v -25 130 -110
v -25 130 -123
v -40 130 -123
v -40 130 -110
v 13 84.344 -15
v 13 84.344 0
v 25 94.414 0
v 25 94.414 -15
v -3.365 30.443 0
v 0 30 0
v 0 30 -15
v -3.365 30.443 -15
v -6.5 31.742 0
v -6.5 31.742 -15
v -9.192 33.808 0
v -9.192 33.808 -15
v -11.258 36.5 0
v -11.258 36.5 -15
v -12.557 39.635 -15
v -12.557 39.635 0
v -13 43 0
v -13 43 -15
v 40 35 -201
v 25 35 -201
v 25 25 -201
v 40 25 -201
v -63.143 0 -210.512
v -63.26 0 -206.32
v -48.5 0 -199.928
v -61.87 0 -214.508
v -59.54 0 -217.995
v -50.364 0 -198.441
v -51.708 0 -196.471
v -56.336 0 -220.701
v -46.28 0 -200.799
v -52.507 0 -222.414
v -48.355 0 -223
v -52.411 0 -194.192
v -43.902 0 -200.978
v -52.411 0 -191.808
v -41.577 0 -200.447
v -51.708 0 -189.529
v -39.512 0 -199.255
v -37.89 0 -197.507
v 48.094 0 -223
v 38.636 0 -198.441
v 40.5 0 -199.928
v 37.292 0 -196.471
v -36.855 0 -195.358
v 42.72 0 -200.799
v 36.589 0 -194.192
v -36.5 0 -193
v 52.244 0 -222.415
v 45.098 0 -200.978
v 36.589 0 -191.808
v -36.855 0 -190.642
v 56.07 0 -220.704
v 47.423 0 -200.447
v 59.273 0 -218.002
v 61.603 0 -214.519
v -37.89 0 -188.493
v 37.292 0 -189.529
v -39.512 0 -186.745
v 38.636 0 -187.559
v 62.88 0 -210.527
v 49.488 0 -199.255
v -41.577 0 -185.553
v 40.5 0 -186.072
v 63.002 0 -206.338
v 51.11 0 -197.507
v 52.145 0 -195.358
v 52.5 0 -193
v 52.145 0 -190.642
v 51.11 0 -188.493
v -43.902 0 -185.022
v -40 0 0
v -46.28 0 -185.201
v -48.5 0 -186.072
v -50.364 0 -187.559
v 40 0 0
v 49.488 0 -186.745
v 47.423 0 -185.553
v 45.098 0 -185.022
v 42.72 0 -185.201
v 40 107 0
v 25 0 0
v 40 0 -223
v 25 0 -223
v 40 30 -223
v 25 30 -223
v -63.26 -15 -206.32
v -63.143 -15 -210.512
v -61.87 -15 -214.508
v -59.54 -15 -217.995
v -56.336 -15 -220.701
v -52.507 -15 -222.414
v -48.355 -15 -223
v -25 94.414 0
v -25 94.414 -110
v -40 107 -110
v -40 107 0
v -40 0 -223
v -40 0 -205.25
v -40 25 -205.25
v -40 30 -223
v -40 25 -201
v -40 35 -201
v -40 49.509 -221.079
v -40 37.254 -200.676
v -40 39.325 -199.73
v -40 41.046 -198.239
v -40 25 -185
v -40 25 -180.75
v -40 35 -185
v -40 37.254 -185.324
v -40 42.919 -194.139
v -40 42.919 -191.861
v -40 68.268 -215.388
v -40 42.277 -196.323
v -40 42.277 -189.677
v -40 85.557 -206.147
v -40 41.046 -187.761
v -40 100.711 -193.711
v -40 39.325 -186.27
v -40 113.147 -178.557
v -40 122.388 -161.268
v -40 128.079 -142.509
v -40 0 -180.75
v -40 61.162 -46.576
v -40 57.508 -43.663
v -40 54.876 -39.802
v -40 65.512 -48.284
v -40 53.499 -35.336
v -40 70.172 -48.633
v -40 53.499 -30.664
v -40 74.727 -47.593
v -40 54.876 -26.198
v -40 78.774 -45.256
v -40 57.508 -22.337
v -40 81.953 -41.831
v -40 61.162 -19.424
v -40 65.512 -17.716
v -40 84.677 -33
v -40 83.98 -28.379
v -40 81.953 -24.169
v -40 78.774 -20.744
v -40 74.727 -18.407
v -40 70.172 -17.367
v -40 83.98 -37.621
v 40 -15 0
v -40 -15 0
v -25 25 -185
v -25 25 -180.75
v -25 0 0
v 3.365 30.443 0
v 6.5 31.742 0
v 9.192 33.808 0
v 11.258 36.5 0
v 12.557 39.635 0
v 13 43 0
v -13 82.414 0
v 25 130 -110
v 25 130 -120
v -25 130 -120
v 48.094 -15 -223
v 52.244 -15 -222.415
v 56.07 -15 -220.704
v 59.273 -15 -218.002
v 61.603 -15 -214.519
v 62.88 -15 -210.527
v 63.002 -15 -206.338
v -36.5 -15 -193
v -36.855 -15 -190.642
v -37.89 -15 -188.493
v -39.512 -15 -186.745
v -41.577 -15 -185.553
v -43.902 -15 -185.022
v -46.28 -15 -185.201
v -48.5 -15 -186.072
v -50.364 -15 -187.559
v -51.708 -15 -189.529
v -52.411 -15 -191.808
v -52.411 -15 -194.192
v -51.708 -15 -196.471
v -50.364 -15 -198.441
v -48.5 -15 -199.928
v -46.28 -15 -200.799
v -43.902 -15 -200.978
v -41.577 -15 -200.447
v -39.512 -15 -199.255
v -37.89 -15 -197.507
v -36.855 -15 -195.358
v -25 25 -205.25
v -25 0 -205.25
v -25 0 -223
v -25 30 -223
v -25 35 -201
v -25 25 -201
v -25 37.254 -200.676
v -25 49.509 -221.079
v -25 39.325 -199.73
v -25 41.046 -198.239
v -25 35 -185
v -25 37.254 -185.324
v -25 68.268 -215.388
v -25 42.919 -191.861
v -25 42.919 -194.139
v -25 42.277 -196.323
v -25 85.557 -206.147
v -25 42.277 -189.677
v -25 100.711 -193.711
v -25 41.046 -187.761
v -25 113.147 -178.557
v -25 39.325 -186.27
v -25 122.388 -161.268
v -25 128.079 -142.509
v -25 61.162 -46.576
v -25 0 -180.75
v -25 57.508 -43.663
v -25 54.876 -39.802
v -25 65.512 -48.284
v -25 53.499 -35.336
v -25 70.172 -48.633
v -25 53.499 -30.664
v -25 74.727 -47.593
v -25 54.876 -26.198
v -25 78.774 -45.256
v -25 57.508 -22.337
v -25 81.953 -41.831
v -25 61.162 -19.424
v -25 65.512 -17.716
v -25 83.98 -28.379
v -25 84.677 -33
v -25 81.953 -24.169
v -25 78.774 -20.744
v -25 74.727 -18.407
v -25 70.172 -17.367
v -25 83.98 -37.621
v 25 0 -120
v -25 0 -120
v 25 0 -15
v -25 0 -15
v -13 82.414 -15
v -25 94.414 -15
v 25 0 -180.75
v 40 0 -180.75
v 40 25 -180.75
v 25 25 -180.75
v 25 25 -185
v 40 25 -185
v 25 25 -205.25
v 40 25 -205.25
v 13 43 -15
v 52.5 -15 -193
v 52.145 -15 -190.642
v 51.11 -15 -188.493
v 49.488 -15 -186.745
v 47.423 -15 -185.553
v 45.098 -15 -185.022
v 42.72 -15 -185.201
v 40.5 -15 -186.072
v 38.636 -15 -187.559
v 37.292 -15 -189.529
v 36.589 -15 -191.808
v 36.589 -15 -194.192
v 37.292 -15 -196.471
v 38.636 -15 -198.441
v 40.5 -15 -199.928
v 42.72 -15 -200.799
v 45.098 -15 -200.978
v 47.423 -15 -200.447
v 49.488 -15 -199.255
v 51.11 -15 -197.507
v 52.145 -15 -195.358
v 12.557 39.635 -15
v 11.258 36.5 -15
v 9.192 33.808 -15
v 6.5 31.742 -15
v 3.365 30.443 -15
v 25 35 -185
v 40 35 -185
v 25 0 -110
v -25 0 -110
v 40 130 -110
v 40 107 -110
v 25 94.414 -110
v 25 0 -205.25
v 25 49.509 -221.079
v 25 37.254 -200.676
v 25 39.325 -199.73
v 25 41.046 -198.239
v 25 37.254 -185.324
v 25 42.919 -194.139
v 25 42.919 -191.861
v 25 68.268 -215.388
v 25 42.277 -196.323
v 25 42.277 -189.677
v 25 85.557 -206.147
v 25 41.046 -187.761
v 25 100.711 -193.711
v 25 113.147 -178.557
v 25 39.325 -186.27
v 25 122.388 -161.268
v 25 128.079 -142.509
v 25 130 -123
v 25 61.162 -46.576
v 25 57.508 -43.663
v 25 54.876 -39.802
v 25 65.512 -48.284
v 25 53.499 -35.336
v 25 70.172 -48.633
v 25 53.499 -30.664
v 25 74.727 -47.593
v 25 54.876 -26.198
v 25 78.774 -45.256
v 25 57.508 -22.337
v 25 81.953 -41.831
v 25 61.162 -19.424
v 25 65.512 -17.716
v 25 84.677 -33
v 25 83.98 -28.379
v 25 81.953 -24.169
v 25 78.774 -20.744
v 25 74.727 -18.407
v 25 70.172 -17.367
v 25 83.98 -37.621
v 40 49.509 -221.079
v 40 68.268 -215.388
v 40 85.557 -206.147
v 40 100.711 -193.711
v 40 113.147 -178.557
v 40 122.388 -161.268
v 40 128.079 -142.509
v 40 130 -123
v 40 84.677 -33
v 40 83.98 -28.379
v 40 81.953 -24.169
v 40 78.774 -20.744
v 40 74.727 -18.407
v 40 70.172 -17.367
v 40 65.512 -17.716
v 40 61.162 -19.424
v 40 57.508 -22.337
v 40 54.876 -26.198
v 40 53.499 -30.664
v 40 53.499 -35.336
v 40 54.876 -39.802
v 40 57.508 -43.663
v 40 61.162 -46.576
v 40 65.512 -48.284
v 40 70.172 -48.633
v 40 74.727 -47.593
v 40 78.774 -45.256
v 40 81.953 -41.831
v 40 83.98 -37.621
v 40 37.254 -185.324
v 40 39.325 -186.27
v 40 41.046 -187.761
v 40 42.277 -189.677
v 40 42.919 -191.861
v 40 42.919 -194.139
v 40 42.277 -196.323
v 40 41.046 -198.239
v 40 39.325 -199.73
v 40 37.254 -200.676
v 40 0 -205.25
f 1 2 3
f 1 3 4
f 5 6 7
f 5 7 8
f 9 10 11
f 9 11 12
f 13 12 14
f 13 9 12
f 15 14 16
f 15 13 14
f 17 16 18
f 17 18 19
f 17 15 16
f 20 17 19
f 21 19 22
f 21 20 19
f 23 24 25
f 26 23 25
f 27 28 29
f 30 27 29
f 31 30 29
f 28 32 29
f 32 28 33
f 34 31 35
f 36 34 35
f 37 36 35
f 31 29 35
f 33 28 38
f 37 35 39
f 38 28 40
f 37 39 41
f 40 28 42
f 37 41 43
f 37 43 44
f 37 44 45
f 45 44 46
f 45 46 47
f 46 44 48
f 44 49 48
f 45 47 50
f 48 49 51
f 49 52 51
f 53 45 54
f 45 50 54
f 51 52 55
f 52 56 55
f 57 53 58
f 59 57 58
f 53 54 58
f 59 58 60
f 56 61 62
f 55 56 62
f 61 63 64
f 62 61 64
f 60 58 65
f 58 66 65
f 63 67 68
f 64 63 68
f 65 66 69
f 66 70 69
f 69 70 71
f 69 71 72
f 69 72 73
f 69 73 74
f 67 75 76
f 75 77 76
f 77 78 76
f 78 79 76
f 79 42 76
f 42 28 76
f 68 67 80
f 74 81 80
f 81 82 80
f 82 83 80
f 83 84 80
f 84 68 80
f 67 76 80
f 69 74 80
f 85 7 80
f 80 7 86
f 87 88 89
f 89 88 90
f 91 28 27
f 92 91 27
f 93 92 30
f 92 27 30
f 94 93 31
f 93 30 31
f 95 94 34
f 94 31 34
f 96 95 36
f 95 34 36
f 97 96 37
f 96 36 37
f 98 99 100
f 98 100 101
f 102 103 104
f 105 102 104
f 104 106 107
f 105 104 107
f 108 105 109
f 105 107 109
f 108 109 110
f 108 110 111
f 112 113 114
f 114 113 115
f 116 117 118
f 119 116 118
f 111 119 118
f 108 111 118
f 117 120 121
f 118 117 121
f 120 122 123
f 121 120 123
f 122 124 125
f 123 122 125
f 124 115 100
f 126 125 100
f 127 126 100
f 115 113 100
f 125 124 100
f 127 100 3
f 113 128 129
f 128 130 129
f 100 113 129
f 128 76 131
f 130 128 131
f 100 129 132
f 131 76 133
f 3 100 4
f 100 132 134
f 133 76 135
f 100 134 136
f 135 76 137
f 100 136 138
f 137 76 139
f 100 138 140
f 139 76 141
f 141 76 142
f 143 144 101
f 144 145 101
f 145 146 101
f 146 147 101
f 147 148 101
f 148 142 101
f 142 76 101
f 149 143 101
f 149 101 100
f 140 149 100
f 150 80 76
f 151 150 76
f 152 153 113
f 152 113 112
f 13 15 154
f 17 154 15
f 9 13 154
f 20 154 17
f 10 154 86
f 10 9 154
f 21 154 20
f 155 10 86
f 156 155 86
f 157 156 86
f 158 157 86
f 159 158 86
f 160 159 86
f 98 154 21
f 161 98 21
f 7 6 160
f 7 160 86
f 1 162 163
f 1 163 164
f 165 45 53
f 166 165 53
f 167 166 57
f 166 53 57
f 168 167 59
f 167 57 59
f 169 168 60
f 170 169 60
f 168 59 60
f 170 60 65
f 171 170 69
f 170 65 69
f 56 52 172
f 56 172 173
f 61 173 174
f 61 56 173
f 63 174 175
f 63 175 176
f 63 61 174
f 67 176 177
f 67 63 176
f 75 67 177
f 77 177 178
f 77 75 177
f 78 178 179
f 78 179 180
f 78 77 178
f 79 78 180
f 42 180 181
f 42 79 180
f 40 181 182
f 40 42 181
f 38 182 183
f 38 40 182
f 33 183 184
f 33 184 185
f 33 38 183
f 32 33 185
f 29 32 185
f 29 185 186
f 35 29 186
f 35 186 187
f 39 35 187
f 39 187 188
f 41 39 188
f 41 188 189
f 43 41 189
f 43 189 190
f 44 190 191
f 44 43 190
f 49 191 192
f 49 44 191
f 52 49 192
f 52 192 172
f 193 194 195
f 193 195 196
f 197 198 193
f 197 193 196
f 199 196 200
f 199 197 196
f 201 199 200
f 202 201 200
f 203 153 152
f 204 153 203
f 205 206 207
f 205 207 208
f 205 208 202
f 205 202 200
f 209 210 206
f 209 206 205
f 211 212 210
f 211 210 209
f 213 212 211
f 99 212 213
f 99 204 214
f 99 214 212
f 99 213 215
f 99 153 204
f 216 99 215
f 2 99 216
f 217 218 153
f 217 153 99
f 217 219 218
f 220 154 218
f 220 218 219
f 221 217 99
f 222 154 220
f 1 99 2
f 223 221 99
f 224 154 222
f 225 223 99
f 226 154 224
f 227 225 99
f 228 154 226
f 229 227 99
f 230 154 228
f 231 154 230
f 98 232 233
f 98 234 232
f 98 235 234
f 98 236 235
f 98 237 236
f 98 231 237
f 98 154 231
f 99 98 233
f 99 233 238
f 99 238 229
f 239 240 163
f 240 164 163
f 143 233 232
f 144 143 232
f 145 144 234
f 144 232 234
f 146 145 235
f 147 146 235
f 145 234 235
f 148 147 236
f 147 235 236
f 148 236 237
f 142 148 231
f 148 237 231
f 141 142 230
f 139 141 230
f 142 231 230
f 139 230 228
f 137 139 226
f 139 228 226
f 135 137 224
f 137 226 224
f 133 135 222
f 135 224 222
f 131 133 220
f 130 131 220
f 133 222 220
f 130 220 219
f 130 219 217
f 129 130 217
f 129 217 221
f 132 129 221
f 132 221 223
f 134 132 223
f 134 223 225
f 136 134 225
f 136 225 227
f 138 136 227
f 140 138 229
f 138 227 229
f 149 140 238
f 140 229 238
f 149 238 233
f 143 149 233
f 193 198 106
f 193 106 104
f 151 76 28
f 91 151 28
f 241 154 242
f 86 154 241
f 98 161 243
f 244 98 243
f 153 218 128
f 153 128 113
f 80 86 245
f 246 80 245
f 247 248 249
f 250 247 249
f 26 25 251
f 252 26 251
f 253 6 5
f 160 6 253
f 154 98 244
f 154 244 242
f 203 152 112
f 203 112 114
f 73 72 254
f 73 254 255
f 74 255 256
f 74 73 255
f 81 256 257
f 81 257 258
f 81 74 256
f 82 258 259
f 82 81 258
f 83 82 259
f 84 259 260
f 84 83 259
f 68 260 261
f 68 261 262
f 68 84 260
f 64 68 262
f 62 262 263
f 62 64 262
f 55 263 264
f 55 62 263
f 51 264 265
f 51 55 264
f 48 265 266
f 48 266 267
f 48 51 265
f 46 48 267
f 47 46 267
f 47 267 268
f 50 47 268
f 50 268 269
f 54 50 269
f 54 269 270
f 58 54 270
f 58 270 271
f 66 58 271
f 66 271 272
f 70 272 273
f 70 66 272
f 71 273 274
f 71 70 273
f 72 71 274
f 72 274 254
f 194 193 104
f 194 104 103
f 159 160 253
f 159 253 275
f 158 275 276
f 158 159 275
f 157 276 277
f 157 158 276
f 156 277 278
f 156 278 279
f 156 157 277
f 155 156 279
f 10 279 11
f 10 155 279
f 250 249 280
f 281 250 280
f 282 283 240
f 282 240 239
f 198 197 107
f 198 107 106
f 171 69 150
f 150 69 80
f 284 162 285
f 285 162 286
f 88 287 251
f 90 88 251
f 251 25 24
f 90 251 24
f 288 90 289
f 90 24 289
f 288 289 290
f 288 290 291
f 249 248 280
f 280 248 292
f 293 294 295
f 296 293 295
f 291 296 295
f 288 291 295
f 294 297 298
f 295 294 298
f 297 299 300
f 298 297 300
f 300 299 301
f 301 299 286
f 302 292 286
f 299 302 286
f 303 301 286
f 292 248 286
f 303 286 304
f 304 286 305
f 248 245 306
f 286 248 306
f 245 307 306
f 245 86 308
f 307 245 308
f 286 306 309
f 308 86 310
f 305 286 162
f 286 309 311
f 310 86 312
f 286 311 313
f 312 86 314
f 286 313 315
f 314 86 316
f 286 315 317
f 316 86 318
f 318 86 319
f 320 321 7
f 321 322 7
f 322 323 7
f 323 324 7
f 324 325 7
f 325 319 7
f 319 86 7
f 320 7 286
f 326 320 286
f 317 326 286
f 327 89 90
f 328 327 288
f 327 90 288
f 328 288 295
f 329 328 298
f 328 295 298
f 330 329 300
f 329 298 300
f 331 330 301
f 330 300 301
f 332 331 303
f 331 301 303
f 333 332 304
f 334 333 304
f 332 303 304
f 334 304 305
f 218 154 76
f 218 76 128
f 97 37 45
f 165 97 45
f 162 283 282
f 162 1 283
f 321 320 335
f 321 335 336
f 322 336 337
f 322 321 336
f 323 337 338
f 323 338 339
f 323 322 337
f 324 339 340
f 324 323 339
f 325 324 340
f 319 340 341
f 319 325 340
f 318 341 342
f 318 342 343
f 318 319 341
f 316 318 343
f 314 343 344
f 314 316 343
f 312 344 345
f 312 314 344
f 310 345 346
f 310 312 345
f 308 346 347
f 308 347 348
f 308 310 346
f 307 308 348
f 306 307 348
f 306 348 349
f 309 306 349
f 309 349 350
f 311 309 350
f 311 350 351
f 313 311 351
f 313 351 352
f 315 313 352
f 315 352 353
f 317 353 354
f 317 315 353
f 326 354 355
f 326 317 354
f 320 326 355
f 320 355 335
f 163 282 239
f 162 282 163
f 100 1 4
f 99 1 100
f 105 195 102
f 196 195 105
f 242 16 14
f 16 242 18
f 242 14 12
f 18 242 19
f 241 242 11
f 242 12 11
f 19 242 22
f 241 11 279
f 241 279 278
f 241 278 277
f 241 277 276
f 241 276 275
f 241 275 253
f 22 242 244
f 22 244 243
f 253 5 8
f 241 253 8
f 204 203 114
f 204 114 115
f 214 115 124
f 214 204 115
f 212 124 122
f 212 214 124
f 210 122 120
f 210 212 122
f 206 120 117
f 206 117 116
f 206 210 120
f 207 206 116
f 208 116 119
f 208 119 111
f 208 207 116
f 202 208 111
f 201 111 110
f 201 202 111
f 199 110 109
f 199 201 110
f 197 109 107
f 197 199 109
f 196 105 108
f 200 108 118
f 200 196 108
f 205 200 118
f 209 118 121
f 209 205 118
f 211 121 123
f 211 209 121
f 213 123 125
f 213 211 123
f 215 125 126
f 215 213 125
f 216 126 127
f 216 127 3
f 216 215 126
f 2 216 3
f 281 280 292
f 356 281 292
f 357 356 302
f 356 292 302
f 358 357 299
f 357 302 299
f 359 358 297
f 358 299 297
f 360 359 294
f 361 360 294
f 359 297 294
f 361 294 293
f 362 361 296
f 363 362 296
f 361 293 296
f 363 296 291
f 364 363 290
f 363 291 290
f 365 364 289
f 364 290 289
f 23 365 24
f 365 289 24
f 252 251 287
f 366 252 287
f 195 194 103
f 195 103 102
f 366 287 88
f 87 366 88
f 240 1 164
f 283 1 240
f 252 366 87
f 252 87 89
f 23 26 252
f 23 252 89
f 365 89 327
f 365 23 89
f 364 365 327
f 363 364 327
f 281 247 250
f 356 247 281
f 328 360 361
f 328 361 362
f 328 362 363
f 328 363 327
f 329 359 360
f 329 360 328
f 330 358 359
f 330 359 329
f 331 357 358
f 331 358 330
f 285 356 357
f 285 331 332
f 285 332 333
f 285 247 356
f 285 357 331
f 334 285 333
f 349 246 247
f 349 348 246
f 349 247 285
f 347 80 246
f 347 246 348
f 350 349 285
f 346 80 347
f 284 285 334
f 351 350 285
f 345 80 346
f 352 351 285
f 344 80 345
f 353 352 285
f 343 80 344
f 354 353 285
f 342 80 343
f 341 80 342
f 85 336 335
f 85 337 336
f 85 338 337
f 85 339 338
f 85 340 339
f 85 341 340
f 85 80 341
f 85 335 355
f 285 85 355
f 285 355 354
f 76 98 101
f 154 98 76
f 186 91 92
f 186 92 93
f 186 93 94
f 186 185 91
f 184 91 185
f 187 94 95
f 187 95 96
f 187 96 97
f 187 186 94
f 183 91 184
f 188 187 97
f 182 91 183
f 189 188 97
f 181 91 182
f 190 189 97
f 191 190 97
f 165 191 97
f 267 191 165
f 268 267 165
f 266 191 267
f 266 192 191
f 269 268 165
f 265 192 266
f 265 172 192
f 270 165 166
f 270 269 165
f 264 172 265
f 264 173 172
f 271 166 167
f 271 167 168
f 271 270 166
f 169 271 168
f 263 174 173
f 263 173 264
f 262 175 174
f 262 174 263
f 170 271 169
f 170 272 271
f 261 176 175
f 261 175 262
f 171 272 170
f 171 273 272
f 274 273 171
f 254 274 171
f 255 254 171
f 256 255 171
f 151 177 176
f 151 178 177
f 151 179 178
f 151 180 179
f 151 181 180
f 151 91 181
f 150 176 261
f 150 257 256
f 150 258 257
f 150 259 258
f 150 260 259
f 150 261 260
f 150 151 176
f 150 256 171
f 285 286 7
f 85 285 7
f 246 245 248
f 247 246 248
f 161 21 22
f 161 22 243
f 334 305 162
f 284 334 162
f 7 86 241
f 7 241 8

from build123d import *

# Parameters (mm, degrees)
F0_R      = 8
F1_DEPTH  = 15
F3_START  = 25
F2_R      = 15.6765625
F3_DEPTH  = 15
F4_SIZE2  = 12.586484
F4_SIZE   = 14.99999
F7_DEPTH  = 15
F8_SIZE2  = 10.069186
F8_SIZE   = 11.99999
F9_SIZE2  = 11.99999
F9_SIZE   = 11.99999
F11_START = -110
F11_DEPTH = 10


# Not quite as in the source:
# - a fillet or chamfer is up to 0.001 mm smaller than in the source, because OpenCascade refuses the exact size


with BuildPart() as f1:
    # F0 (on Front) → F1 (new body)
    with BuildSketch(Plane.XZ):
        with BuildLine():
            Line((-48.3547807248, -223), (0, -223))
            Line((0, -223), (48.0940515583, -223))
            ThreePointArc((48.0940515583, -223), (59.27277344, -218.001808691), (63.0017099144, -206.3381569454))
            Line((63.0017099144, -206.3381569454), (40, 0))
            Line((40, 0), (0, 0))
            Line((0, 0), (-40, 0))
            Line((-40, 0), (-63.2603535366, -206.3195538826))
            ThreePointArc((-63.2603535366, -206.3195538826), (-59.5397414257, -217.9948313702), (-48.3547807248, -223))
        make_face()
        with Locations((-44.5, -193)):
            Circle(F0_R, mode=Mode.SUBTRACT)
        with Locations((44.5, -193)):
            Circle(F0_R, mode=Mode.SUBTRACT)
    extrude(amount=F1_DEPTH)


with BuildPart() as f3:
    # F2 (on Right) → F3 (new body)
    with BuildSketch(Plane.YZ.offset(F3_START)):
        with BuildLine():
            Line((107, 0), (0, 0))
            Line((0, 0), (0, -180.75))
            Line((0, -180.75), (25, -180.75))
            Line((25, -180.75), (25, -185))
            Line((25, -185), (35, -185))
            ThreePointArc((35, -185), (43, -193), (35, -201))
            Line((35, -201), (25, -201))
            Line((25, -201), (25, -205.25))
            Line((25, -205.25), (0, -205.25))
            Line((0, -205.25), (0, -223))
            Line((0, -223), (30, -223))
            ThreePointArc((30, -223), (100.7106781187, -193.7106781187), (130, -123))
            Line((130, -123), (130, -110))
            Line((130, -110), (107, -110))
            Line((107, -110), (107, 0))
        make_face()
        with Locations((69, -33)):
            Circle(F2_R, mode=Mode.SUBTRACT)
    extrude(amount=F3_DEPTH)

    # F4 (size 15 and 12.5864944677 in the source; OpenCascade refuses exactly that, so slightly less here)
    f4_edges = [f3.edges().sort_by_distance(p)[0] for p in [
        (25, 107, -55),
    ]]
    f4_side = f3.faces().sort_by_distance((32.5, 107, -55))[0]
    chamfer(f4_edges, length=F4_SIZE, length2=F4_SIZE2, reference=f4_side)


with BuildPart() as f5_1:
    # F5: instance of F3
    add(f3.part.mirror(Plane.YZ))


with BuildPart() as f7:
    # F6 (on Top) → F7 (new body)
    with BuildSketch(Plane.XY):
        with BuildLine():
            Line((-25, 0), (0, 0))
            Line((0, 0), (25, 0))
            Line((25, 0), (25, 94.4135055323))
            Line((25, 94.4135055323), (13, 94.4135055323))
            Line((13, 94.4135055323), (13, 43))
            ThreePointArc((13, 43), (9.1923881554, 33.8076118446), (0, 30))
            ThreePointArc((0, 30), (-9.1923881554, 33.8076118446), (-13, 43))
            Line((-13, 43), (-13, 94.4135055323))
            Line((-13, 94.4135055323), (-25, 94.4135055323))
            Line((-25, 94.4135055323), (-25, 0))
        make_face()
    extrude(amount=-F7_DEPTH)

    # F8 (size 12 and 10.0691955741 in the source; OpenCascade refuses exactly that, so slightly less here)
    f8_edges = [f7.edges().sort_by_distance(p)[0] for p in [
        (13, 94.413506, -7.5),
    ]]
    f8_side = f7.faces().sort_by_distance((19, 94.413506, -7.5))[0]
    chamfer(f8_edges, length=F8_SIZE, length2=F8_SIZE2, reference=f8_side)

    # F9 (size 12 and 12 in the source; OpenCascade refuses exactly that, so slightly less here)
    f9_edges = [f7.edges().sort_by_distance(p)[0] for p in [
        (-13, 94.413506, -7.5),
    ]]
    chamfer(f9_edges, length=F9_SIZE, length2=F9_SIZE2)


with BuildPart() as f11:
    # F10 (on Top) → F11 (new body)
    with BuildSketch(Plane.XY.offset(F11_START)):
        Polygon((-25, 0), (0, 0), (25, 0), (25, 130), (-25, 130), align=None)
    extrude(amount=-F11_DEPTH)


solid = Compound([f1.part, f3.part, f5_1.part, f7.part, f11.part])
